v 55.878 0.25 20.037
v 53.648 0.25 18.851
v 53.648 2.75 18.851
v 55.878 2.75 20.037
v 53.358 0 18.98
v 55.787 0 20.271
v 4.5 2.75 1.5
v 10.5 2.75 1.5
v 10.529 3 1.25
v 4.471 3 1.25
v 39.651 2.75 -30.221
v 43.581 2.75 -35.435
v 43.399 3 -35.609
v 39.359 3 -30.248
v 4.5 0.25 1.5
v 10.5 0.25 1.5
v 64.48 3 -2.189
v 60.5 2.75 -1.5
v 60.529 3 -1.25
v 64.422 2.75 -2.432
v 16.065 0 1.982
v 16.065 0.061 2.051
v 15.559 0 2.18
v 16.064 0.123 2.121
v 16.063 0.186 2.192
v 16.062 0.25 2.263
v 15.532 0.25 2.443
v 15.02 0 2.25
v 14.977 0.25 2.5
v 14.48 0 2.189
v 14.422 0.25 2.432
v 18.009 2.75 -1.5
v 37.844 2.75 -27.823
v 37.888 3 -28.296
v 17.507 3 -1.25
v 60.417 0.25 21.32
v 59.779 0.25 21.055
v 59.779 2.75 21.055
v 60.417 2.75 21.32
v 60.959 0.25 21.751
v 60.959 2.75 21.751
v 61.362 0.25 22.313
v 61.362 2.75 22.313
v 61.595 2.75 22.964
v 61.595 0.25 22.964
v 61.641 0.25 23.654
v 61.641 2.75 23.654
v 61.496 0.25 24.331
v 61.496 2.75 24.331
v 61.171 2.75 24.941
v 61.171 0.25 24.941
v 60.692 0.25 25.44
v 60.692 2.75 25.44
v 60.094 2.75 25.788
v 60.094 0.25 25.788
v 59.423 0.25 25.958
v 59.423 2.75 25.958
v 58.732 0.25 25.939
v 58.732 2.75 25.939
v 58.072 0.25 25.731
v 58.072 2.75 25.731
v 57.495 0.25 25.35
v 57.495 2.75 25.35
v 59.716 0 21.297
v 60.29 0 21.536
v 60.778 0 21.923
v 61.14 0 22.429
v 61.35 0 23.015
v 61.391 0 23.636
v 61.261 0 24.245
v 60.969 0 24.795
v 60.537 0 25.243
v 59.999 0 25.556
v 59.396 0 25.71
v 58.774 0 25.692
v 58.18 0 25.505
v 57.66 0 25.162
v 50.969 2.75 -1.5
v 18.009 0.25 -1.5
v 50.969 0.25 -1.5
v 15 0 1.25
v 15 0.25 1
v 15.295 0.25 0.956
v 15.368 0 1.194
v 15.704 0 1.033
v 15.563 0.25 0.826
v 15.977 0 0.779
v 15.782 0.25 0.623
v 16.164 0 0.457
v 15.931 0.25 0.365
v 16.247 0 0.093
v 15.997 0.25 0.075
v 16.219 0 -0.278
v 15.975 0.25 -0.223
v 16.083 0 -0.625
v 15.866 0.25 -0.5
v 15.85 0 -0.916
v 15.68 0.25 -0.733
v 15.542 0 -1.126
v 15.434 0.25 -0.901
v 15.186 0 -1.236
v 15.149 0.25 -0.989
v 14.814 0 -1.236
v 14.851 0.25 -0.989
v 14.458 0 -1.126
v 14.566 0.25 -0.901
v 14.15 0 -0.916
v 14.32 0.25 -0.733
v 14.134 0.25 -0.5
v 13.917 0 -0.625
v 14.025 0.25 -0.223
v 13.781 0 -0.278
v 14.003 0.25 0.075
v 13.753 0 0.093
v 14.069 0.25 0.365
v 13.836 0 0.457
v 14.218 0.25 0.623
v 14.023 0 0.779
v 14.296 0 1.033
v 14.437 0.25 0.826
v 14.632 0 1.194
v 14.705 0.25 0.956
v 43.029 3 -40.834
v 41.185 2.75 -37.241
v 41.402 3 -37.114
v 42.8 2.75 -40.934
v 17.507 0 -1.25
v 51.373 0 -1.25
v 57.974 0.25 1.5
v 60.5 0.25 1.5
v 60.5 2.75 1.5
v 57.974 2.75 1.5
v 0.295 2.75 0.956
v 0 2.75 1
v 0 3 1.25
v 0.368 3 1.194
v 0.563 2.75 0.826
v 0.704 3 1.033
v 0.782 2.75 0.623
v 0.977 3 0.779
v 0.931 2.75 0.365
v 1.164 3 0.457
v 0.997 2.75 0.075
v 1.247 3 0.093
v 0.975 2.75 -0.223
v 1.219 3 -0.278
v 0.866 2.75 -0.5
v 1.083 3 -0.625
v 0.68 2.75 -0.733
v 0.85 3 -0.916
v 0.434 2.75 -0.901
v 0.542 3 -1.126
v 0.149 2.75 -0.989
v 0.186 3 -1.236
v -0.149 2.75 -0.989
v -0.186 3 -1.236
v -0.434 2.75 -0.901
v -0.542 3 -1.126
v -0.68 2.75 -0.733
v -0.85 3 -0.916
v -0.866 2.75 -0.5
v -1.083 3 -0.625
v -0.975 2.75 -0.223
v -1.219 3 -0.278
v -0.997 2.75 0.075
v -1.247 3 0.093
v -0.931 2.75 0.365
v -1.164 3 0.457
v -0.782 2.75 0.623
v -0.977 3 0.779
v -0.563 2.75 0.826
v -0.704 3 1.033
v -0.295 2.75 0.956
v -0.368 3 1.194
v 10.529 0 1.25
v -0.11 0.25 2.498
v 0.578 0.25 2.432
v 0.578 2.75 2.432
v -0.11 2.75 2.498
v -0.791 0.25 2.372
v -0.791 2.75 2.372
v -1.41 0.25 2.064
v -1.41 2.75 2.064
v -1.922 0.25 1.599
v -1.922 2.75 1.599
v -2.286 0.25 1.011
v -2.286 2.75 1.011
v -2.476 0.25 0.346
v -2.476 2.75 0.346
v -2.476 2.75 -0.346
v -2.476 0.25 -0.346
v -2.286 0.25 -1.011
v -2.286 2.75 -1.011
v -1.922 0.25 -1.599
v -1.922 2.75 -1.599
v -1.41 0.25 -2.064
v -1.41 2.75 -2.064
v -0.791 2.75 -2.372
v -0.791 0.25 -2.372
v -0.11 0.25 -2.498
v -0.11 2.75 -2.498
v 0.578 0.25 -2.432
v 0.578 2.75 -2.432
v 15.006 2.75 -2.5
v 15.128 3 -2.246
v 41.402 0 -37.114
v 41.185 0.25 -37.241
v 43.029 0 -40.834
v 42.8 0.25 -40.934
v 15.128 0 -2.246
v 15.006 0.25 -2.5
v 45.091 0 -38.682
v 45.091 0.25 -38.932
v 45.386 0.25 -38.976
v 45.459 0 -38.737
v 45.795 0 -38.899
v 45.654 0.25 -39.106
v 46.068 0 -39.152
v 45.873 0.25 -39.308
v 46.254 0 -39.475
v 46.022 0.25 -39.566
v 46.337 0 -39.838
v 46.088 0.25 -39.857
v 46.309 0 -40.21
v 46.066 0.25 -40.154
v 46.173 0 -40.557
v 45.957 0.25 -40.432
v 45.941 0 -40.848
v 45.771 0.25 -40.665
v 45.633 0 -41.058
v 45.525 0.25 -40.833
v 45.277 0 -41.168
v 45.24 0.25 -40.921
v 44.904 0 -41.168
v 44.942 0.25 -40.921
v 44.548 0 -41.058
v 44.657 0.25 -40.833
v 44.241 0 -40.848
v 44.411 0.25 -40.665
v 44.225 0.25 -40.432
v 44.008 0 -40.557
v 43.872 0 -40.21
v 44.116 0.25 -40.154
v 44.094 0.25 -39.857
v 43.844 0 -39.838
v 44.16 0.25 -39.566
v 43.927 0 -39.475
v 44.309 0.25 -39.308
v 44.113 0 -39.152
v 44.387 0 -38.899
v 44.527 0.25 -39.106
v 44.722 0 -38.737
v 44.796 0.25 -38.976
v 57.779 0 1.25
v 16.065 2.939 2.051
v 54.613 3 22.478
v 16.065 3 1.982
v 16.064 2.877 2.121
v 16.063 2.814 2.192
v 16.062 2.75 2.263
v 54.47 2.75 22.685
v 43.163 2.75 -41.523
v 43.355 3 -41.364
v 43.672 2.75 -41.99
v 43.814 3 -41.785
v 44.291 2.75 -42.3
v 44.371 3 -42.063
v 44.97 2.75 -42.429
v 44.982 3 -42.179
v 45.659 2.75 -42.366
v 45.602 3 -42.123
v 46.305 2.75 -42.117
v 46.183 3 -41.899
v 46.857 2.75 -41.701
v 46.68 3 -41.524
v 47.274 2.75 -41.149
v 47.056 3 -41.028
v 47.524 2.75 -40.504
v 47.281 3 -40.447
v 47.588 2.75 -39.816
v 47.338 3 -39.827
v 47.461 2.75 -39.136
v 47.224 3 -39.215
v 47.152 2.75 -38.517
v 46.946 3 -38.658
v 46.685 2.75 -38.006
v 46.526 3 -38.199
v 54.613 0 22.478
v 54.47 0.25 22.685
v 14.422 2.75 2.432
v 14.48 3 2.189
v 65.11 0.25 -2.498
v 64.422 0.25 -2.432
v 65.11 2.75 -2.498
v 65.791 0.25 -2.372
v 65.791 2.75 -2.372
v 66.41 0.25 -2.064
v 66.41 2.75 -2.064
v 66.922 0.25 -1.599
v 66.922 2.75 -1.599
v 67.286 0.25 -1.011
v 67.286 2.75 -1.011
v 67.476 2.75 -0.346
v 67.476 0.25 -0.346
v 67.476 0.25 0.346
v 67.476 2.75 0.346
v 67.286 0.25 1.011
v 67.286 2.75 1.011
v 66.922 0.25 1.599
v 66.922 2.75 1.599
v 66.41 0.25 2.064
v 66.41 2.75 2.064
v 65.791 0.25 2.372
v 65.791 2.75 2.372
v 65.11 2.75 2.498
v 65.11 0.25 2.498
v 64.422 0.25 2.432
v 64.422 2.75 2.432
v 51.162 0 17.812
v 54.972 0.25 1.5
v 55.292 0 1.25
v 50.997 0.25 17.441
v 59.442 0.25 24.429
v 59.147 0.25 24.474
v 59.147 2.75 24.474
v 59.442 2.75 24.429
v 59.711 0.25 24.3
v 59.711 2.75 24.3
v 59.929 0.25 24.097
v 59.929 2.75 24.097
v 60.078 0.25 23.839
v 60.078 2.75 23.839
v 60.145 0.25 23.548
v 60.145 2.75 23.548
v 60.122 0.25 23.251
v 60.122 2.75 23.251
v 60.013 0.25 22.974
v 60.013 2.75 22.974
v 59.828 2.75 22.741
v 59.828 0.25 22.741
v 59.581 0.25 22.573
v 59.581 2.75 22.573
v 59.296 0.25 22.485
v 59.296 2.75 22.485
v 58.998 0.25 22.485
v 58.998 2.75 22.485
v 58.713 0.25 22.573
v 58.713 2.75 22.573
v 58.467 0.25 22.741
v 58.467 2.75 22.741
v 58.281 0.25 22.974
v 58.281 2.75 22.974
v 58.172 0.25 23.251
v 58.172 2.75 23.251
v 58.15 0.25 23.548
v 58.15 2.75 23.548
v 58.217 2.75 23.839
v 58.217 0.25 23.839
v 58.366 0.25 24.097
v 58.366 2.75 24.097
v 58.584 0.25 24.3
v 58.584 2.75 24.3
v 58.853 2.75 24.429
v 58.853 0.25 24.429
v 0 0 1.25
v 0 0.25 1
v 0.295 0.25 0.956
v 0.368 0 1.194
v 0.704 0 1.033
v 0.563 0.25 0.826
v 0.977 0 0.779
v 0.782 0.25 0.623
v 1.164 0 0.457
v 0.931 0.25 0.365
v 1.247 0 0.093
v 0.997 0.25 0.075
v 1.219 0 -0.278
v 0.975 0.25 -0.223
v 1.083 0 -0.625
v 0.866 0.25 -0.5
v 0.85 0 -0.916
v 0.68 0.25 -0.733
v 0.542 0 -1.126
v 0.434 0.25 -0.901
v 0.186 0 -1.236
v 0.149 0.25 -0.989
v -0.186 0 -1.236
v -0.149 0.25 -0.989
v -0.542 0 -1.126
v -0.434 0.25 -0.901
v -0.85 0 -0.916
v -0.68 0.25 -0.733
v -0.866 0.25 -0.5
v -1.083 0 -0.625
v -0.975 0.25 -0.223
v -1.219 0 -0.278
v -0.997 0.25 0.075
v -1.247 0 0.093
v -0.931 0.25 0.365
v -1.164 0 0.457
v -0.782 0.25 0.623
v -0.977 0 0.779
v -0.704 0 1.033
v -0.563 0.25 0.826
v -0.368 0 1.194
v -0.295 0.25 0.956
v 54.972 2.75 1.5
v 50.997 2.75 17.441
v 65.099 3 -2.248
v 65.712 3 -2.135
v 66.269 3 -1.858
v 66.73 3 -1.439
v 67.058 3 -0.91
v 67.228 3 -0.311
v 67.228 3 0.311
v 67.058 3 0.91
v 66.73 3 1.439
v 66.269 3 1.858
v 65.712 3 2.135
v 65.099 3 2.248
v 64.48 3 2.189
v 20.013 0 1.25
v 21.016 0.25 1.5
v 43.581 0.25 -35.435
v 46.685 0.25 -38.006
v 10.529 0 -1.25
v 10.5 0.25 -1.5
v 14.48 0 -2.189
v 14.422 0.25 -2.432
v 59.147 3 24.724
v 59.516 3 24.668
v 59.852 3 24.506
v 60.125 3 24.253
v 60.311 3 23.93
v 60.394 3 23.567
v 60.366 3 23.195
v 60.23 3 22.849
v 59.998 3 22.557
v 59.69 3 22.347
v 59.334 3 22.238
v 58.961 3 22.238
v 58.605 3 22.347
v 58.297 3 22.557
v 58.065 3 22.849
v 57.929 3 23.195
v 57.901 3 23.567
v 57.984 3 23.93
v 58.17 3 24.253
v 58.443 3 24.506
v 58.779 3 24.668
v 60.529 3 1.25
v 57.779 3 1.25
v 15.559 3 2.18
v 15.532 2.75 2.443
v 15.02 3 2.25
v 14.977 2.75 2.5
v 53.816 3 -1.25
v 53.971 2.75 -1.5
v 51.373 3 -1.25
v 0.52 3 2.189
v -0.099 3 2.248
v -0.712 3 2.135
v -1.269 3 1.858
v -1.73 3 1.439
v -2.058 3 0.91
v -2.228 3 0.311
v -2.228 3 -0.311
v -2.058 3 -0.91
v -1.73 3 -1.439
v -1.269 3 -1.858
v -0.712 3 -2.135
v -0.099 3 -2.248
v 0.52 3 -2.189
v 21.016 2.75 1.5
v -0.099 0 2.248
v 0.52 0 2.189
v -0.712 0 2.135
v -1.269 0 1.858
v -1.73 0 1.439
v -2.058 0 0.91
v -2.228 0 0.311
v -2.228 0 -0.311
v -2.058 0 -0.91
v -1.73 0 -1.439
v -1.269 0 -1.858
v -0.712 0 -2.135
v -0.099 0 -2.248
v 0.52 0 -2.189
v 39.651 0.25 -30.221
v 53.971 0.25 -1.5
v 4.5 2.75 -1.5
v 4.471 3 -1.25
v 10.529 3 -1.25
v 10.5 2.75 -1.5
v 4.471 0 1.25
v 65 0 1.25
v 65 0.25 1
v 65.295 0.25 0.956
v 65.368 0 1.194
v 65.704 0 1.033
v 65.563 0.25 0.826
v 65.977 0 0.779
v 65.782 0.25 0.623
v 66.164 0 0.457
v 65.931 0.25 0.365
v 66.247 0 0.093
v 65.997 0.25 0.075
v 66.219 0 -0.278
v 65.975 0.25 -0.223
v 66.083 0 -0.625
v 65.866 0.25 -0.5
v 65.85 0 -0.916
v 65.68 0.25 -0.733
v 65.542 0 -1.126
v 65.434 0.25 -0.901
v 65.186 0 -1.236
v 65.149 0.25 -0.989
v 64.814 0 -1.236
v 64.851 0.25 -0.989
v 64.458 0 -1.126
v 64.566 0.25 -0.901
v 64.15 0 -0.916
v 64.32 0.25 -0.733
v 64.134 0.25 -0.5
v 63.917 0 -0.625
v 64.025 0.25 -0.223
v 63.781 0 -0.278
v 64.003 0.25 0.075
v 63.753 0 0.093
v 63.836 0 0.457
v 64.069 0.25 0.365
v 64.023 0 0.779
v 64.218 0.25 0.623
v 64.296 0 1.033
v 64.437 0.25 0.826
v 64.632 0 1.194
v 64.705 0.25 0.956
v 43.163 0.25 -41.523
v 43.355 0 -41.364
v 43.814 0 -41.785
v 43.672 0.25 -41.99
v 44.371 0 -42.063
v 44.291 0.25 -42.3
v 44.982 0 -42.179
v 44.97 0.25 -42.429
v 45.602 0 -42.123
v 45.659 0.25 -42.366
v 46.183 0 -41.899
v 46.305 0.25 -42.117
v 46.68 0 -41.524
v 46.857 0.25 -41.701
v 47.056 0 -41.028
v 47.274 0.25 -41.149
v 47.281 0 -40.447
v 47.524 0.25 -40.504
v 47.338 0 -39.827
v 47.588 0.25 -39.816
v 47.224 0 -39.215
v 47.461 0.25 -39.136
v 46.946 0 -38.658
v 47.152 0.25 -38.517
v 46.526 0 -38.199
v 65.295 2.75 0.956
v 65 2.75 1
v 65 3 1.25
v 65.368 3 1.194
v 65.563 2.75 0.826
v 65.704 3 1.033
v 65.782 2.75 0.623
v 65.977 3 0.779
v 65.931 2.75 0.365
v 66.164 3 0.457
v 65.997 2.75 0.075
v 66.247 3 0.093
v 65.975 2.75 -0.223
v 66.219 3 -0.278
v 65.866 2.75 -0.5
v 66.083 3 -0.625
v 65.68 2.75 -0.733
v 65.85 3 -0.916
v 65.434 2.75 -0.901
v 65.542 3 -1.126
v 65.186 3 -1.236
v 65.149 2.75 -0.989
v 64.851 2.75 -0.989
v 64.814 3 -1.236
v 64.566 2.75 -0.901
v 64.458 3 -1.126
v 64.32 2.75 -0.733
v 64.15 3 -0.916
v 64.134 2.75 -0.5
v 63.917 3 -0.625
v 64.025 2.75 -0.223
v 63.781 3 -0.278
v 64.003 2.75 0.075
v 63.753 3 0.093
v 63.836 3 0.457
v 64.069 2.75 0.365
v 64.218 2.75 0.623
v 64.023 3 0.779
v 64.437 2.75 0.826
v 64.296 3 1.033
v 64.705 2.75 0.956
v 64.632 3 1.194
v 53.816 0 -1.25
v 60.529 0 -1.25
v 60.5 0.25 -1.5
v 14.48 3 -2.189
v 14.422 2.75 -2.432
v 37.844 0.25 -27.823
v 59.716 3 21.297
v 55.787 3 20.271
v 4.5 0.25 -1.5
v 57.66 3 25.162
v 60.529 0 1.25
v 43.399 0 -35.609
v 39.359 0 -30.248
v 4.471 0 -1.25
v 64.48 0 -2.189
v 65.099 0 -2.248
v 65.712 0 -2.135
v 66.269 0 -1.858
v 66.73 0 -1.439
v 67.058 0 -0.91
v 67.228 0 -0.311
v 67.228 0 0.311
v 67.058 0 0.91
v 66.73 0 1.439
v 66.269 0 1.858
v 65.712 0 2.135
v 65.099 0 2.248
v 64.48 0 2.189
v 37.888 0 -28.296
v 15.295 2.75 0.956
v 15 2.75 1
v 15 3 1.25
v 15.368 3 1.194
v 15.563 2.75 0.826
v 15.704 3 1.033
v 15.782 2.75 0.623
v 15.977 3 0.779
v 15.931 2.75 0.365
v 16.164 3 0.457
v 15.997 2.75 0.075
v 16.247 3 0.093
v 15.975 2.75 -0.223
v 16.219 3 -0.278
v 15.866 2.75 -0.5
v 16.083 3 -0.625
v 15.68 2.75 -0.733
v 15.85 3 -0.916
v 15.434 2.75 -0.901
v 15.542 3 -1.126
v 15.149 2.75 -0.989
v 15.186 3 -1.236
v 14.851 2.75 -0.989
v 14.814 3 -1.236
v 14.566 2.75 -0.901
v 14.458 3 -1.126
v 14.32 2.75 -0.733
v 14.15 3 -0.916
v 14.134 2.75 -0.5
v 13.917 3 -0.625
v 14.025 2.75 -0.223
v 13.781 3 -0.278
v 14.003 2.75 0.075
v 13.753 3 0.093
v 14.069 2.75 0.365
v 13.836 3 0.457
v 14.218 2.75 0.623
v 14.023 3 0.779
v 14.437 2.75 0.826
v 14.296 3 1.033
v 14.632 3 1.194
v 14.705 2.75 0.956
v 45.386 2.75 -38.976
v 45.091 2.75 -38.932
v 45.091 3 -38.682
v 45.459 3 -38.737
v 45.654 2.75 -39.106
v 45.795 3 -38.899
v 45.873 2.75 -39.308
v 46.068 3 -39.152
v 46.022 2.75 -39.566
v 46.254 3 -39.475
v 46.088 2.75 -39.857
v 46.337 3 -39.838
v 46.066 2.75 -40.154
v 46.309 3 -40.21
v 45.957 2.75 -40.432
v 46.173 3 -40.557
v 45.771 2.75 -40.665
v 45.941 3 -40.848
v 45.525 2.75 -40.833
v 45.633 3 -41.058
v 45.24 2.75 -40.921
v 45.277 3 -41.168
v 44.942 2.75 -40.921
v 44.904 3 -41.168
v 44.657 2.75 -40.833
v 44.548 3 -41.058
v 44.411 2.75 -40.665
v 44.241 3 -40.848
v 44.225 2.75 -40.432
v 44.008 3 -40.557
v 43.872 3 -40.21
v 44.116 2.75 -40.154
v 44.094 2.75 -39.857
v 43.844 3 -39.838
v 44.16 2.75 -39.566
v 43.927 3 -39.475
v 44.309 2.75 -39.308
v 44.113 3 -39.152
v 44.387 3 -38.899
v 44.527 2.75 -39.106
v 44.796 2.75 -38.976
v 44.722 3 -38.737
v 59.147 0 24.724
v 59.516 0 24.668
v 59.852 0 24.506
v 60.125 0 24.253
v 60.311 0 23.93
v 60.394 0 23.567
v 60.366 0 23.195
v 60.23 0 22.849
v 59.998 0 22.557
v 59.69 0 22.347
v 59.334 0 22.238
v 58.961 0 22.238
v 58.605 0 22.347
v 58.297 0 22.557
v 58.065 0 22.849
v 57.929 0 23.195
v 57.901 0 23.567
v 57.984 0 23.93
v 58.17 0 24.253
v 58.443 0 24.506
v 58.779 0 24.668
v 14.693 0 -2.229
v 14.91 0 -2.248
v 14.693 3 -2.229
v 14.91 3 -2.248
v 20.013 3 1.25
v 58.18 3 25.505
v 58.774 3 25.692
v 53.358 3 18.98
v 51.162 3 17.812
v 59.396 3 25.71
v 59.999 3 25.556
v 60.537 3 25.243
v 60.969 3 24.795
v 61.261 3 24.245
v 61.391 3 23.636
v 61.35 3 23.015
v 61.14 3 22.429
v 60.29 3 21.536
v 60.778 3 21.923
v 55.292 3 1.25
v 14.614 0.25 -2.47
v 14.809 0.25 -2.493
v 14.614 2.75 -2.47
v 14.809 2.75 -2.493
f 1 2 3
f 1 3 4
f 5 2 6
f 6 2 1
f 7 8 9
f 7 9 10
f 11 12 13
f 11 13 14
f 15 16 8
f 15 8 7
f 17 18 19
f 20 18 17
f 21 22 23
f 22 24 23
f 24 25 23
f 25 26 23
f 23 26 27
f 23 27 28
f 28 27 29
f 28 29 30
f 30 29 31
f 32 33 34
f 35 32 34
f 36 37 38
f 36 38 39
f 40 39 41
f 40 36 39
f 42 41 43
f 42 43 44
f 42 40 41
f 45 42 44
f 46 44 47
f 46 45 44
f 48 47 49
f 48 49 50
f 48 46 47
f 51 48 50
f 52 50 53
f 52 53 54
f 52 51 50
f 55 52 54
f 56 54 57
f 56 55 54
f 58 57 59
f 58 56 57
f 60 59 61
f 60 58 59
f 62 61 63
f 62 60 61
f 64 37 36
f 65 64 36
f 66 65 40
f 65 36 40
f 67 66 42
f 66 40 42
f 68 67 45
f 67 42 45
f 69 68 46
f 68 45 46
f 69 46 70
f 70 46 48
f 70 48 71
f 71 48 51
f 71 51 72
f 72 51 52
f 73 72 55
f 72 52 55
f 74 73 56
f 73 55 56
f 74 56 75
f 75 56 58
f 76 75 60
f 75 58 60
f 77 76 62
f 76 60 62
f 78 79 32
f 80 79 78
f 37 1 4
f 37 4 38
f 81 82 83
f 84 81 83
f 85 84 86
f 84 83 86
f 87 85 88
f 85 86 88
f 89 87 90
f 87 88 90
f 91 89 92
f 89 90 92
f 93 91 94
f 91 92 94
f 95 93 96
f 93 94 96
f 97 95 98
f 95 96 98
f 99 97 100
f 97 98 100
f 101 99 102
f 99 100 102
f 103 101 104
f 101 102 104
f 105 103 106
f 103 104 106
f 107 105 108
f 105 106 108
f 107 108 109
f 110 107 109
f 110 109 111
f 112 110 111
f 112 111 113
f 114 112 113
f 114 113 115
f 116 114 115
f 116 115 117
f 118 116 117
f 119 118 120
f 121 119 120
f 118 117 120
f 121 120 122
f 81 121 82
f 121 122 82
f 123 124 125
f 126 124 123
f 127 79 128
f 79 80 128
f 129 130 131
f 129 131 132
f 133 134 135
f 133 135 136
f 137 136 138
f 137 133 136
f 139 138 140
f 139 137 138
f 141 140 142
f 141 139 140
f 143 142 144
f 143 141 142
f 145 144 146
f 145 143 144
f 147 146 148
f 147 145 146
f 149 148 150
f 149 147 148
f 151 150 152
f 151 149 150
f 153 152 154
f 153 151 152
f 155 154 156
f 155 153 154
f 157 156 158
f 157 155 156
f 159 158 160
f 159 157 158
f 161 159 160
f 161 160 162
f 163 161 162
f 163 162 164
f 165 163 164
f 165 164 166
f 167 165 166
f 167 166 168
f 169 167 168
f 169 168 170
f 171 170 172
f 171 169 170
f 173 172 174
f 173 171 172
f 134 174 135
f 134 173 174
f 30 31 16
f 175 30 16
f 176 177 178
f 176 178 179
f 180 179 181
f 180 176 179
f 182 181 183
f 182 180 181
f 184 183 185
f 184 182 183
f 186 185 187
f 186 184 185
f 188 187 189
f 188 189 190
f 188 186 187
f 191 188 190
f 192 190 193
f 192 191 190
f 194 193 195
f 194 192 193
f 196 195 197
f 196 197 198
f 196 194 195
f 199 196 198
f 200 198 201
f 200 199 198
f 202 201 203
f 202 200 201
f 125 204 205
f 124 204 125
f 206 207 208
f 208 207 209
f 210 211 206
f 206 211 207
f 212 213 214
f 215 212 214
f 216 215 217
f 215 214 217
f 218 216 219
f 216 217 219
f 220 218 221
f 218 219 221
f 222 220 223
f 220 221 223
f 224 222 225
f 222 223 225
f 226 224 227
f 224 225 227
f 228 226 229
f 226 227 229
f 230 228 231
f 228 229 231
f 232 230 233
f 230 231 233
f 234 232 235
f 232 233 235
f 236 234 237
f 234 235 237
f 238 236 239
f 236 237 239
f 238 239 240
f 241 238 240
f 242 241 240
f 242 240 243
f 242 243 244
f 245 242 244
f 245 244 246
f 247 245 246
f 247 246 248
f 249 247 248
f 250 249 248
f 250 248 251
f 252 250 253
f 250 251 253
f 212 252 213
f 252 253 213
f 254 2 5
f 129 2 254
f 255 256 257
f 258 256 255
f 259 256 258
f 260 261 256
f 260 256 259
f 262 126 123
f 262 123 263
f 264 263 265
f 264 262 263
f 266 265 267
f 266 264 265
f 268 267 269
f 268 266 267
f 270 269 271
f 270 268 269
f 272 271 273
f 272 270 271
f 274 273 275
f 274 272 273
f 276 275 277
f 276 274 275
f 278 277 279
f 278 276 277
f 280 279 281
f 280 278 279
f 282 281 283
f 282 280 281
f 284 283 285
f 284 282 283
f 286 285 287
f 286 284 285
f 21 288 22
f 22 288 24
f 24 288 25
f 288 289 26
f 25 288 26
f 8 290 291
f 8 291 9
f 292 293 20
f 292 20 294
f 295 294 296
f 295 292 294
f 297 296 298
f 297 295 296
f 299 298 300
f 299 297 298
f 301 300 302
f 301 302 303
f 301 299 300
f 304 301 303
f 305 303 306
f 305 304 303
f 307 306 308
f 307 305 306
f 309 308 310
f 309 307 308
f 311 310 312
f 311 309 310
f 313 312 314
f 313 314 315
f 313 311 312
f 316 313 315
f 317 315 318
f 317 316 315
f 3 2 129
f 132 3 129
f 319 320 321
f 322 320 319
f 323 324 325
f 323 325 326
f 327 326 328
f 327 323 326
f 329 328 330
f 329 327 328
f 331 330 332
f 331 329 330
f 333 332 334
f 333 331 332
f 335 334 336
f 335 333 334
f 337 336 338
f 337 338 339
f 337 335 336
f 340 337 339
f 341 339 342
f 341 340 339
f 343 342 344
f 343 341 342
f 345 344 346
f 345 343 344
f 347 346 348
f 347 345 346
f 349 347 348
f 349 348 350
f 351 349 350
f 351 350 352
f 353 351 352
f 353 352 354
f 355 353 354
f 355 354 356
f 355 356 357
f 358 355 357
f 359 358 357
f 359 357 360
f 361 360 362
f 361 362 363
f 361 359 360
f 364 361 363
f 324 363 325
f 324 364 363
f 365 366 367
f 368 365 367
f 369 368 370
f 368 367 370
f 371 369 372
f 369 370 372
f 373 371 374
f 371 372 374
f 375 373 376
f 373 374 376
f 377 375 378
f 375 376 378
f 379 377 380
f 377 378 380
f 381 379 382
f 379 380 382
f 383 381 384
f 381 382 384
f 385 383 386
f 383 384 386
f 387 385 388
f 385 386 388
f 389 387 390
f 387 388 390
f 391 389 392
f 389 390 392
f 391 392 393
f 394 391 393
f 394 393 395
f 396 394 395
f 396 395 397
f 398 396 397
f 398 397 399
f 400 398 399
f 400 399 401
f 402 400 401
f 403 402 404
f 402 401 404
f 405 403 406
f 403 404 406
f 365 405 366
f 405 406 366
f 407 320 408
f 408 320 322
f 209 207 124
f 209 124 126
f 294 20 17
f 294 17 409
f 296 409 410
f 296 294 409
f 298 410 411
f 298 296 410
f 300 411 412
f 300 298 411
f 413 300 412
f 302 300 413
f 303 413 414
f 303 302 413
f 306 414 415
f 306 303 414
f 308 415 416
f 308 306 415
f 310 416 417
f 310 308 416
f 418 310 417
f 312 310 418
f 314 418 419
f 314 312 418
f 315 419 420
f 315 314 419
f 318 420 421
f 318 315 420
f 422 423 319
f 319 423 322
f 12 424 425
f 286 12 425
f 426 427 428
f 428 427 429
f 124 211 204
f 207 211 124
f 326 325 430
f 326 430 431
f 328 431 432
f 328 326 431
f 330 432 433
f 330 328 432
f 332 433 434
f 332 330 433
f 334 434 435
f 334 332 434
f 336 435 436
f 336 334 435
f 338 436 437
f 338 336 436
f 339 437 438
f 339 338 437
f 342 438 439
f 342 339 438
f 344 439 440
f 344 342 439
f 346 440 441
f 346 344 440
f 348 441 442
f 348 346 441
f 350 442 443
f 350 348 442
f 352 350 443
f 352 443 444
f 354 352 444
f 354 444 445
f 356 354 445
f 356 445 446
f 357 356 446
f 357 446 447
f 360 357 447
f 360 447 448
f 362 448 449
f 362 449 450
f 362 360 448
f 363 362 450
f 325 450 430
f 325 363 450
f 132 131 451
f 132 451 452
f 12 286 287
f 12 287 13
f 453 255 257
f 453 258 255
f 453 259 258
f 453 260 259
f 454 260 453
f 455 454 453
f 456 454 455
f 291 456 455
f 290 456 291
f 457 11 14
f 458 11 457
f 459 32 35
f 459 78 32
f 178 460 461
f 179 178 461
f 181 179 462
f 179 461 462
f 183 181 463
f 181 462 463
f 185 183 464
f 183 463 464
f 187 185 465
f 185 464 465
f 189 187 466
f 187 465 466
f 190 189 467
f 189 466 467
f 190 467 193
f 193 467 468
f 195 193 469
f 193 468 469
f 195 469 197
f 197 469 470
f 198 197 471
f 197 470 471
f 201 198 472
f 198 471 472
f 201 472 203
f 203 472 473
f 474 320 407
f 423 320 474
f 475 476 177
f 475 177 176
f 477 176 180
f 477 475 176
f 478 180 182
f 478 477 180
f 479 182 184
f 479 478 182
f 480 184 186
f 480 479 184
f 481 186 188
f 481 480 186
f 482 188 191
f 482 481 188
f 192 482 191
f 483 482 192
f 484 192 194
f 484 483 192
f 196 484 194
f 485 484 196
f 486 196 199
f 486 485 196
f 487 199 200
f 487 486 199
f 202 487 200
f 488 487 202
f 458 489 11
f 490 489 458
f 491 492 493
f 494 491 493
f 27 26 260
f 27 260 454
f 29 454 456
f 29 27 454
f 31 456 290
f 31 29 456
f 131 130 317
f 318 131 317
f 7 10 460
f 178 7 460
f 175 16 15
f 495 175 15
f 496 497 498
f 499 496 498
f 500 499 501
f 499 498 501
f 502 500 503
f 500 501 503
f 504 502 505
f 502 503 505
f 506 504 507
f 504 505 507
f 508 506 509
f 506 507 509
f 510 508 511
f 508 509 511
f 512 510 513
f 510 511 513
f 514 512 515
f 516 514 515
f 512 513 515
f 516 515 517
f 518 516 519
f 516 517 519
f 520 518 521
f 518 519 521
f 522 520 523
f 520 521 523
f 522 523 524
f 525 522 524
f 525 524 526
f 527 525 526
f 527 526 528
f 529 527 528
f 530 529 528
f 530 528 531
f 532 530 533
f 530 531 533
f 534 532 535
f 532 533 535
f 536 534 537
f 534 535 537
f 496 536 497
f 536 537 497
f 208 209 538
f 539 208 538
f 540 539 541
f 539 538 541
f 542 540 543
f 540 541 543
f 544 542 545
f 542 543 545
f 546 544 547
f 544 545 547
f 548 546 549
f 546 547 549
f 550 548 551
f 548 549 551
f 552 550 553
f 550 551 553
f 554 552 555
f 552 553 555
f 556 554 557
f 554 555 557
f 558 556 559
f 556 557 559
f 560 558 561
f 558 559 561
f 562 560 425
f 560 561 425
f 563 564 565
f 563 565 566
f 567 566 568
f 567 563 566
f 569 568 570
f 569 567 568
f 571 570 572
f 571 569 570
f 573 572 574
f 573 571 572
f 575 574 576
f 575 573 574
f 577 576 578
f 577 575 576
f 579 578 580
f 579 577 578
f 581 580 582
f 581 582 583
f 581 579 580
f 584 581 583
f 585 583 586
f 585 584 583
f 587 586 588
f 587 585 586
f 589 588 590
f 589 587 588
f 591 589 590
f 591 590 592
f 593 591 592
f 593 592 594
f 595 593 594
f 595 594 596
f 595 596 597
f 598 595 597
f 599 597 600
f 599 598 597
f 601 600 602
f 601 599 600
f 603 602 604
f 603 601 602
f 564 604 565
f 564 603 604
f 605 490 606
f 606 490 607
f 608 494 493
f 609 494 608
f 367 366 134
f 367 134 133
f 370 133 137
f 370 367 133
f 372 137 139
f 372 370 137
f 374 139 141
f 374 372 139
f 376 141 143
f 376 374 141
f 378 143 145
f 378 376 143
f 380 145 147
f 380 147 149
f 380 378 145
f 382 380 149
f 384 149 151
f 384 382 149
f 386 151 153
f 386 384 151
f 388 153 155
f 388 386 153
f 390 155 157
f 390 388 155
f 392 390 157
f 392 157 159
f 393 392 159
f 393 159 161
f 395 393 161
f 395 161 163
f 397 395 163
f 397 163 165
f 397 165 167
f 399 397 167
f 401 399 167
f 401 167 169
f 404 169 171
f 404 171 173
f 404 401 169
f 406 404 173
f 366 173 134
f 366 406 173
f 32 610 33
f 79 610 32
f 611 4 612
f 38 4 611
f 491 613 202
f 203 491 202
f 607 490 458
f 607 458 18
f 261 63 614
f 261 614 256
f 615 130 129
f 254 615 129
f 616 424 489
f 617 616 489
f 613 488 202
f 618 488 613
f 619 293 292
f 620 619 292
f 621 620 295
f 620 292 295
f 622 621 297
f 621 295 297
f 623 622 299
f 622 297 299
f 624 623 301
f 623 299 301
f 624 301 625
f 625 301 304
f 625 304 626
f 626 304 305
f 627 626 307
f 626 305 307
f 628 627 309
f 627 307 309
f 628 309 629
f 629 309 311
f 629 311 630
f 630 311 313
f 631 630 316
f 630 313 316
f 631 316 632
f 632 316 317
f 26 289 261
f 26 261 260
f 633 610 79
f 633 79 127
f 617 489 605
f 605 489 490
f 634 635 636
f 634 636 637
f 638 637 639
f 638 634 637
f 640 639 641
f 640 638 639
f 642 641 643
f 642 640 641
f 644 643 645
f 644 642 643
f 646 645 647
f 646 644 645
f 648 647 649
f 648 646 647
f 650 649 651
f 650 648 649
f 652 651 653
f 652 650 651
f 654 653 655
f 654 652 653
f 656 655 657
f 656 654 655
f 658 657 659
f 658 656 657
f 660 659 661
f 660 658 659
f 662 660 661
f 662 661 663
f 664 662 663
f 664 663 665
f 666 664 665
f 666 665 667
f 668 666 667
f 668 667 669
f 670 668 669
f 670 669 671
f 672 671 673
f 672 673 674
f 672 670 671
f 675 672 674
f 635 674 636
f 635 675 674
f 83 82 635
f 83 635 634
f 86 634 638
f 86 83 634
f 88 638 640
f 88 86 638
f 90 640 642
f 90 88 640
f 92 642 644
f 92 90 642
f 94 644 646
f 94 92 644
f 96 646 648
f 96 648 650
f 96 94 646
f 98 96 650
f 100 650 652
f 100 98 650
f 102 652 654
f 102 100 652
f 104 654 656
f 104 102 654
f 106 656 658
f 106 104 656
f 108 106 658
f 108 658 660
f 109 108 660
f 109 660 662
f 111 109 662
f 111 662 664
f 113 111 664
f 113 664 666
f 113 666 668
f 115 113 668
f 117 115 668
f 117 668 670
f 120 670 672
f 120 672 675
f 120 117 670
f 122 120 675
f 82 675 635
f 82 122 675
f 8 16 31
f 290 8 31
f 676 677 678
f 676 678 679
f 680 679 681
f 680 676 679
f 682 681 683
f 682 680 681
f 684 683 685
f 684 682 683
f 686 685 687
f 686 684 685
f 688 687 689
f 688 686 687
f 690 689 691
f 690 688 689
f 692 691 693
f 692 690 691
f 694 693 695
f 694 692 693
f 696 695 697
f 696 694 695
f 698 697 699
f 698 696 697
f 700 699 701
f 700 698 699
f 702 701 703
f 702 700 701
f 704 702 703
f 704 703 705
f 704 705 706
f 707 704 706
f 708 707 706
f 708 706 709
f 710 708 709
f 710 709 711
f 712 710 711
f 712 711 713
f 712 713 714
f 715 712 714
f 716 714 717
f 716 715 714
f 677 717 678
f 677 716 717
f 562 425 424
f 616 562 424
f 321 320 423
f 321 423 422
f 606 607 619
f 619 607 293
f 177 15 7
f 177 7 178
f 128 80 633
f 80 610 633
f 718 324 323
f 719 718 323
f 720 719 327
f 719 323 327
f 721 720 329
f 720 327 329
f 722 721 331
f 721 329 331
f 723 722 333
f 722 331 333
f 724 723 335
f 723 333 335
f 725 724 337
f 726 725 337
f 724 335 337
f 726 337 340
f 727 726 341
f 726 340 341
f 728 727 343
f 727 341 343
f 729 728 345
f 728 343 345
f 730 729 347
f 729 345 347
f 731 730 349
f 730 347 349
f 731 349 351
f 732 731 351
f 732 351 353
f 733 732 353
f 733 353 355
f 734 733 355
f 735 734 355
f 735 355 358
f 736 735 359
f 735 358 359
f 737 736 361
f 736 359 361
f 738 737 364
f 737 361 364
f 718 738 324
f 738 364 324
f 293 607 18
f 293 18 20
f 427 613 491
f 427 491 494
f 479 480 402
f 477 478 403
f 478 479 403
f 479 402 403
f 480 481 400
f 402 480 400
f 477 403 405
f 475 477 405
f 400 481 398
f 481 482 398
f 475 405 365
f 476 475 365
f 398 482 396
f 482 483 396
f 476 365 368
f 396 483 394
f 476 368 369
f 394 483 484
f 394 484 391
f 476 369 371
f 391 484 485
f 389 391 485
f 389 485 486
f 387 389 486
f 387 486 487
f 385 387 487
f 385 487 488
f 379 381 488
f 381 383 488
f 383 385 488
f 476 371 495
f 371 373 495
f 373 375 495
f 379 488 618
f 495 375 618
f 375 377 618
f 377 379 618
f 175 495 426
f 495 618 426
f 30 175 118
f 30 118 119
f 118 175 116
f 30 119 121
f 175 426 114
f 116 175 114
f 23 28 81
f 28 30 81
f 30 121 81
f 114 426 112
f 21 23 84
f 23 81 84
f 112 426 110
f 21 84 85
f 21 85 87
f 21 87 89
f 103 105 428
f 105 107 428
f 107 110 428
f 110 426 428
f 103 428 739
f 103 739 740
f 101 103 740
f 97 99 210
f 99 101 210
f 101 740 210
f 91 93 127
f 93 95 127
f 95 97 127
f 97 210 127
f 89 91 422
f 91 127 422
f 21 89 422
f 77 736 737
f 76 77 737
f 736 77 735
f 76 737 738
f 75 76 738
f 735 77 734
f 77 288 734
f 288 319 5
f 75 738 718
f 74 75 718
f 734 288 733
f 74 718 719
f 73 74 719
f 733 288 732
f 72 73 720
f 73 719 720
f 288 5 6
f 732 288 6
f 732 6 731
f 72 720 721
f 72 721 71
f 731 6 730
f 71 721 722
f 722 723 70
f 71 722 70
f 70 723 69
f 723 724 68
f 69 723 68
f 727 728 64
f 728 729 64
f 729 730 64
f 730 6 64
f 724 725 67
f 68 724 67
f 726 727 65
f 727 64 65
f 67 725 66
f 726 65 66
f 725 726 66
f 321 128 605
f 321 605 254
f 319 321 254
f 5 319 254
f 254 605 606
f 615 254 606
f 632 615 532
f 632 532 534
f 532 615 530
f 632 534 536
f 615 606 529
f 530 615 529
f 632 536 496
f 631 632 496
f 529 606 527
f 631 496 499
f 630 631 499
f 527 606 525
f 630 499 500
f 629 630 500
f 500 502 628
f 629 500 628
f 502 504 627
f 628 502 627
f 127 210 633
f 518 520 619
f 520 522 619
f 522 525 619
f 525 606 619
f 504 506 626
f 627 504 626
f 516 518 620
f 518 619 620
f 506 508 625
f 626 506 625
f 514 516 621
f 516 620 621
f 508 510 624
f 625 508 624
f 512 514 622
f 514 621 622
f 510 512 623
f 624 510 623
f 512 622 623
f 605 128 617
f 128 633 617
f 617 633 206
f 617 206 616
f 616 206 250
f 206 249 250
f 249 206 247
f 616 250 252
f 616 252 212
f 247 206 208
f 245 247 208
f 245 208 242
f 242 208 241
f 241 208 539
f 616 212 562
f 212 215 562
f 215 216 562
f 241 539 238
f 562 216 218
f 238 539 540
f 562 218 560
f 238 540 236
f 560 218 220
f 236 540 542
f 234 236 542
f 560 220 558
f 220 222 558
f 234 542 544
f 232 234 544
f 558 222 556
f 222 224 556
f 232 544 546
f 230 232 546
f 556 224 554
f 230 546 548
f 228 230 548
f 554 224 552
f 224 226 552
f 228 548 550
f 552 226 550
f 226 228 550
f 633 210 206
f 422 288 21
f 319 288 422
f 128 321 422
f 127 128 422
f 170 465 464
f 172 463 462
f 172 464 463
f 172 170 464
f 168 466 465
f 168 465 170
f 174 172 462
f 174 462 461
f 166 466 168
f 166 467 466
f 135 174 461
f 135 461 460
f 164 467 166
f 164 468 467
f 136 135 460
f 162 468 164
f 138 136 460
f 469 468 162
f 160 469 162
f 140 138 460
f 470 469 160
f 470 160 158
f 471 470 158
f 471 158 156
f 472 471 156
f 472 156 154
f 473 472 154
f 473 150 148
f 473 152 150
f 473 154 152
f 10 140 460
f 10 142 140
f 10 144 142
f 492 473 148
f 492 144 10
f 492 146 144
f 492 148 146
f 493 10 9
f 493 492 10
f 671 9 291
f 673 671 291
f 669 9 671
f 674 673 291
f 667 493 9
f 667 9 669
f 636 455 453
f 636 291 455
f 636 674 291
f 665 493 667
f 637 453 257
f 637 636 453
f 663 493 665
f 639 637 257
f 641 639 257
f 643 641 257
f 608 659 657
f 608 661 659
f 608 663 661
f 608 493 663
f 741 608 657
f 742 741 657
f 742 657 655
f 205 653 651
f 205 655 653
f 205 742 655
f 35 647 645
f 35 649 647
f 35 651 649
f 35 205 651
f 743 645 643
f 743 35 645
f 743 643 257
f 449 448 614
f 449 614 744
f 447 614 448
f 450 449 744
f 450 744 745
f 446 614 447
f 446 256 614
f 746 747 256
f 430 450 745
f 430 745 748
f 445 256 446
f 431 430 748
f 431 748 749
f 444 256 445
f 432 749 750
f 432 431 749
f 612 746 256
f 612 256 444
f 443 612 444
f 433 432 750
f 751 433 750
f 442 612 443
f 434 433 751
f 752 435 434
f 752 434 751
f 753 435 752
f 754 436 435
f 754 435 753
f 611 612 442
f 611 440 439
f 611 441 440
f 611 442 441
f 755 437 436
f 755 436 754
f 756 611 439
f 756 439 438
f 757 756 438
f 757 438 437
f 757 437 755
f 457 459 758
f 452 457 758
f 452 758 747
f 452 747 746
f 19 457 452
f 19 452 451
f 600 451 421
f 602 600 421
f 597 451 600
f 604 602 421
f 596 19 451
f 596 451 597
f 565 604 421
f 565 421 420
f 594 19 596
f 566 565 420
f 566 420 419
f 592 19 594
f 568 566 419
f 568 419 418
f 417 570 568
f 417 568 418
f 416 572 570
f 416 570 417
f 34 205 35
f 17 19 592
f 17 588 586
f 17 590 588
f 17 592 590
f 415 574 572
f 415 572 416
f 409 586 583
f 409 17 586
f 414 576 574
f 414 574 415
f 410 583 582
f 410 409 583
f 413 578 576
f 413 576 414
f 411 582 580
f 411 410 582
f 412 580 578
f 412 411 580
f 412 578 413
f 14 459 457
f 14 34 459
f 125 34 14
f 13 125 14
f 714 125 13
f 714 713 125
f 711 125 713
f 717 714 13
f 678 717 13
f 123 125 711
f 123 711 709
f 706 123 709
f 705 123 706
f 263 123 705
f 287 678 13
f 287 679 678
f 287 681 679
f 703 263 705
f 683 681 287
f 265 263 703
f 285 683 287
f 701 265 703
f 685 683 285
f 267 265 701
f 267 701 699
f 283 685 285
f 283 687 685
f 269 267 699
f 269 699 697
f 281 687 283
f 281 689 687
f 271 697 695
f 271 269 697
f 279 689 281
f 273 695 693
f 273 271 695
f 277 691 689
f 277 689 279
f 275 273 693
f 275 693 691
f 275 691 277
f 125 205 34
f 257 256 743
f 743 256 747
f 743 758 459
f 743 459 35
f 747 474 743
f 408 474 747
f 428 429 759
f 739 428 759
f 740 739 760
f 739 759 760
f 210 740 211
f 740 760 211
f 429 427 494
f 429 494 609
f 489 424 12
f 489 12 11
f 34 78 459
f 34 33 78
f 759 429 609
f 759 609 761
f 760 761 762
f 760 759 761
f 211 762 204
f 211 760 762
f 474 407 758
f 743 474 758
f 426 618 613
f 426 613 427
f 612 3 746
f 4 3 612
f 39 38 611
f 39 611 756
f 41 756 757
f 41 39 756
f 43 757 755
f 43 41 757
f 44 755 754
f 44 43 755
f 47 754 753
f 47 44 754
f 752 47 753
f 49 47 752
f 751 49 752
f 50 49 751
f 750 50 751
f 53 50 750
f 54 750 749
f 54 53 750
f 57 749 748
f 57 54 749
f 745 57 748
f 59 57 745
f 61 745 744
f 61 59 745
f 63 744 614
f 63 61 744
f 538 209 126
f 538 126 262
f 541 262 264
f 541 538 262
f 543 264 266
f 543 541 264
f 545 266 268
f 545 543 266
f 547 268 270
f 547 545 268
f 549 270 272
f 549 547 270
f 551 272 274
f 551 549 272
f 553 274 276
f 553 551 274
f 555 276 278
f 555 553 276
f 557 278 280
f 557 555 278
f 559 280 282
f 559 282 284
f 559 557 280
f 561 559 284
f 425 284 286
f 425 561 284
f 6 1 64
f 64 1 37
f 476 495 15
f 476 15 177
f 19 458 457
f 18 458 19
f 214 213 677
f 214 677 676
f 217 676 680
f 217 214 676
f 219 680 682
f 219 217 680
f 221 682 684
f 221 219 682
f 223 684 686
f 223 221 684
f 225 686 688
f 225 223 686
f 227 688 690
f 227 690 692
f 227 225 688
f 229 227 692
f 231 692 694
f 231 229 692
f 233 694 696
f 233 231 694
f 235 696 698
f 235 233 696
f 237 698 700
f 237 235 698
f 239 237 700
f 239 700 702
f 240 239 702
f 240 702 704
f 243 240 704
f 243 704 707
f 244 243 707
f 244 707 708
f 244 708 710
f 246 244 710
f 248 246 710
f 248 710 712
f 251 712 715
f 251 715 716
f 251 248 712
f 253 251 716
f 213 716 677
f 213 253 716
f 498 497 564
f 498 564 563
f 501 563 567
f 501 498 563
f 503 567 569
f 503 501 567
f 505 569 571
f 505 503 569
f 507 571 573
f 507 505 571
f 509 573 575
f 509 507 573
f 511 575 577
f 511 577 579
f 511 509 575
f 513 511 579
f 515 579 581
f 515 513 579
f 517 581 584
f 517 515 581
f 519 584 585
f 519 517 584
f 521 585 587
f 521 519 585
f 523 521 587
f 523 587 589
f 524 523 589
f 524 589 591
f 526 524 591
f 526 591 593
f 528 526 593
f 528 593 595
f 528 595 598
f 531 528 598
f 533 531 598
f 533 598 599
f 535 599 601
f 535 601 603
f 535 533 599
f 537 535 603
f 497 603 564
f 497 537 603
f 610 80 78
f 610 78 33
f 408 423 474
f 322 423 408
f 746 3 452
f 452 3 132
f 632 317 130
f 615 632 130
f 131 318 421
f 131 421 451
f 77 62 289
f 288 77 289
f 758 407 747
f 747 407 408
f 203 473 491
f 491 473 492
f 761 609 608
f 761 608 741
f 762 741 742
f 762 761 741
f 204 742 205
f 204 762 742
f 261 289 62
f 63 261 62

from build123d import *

# Parameters (mm, degrees)
SKETCH_1_R      = 1
EXTRUDE_2_DEPTH = 3
SKETCH_3_R      = 1
EXTRUDE_3_DEPTH = 3
EXTRUDE_4_DEPTH = 3
EXTRUDE_5_DEPTH = 3
EXTRUDE_6_DEPTH = 3
CHAMFER_1_SIZE  = 0.25


with BuildPart() as part:
    # 草图1 → 凸台-拉伸2 (new body)
    with BuildSketch(Plane(origin=(0, 0, 0), x_dir=(1, 0, 0), z_dir=(0, 1, 0))):
        with BuildLine():
            Line((2, 1.5), (13, 1.5))
            ThreePointArc((13, 1.5), (15, 2.5), (17, 1.5))
            Line((17, 1.5), (63, 1.5))
            ThreePointArc((63, 1.5), (67.5, 0), (63, -1.5))
            Line((63, -1.5), (17, -1.5))
            ThreePointArc((17, -1.5), (15, -2.5), (13, -1.5))
            Line((13, -1.5), (2, -1.5))
            ThreePointArc((2, -1.5), (-2.5, 0), (2, 1.5))
        make_face()
        with Locations(Location((0, 0, 0), (0, 0, 270))):
            Circle(SKETCH_1_R, mode=Mode.SUBTRACT)
        with Locations(Location((15, 0, 0), (0, 0, 270))):
            Circle(SKETCH_1_R, mode=Mode.SUBTRACT)
        with Locations(Location((65, 0, 0), (0, 0, 270))):
            Circle(SKETCH_1_R, mode=Mode.SUBTRACT)
    extrude(amount=EXTRUDE_2_DEPTH)

    # 草图3 → 凸台-拉伸3 (add)
    with BuildSketch(Plane(origin=(0, 0, 0), x_dir=(1, 0, 0), z_dir=(0, 1, 0))):
        with BuildLine():
            Line((15.005676781, 2.499993555), (42.689167846, 39.237227017))
            ThreePointArc((42.689167846, 39.237227017), (46.595288715, 41.928364277), (45.085074376, 37.431781948))
            Line((45.085074376, 37.431781948), (17.401583311, 0.694548485))
            ThreePointArc((17.401583311, 0.694548485), (17.440740018, 0.541099035), (17.47010253, 0.385478264))
            Line((17.47010253, 0.385478264), (58.085691801, -21.210213624))
            ThreePointArc((58.085691801, -21.210213624), (61.354748625, -24.647257046), (56.677277113, -23.859056403))
            Line((56.677277113, -23.859056403), (16.061687842, -2.263364515))
            ThreePointArc((16.061687842, -2.263364515), (12.559259982, -0.541099035), (15.005676781, 2.499993555))
        make_face()
        with Locations(Location((59.147379643, -23.473578139, 0), (0, 0, 270))):
            Circle(SKETCH_3_R, mode=Mode.SUBTRACT)
        with Locations(Location((45.090751158, 39.931775502, 0), (0, 0, 270))):
            Circle(SKETCH_3_R, mode=Mode.SUBTRACT)
        with Locations(Location((15, 0, 0), (0, 0, 270))):
            Circle(SKETCH_3_R, mode=Mode.SUBTRACT)
    extrude(amount=EXTRUDE_3_DEPTH)

    # 草图5 → 凸台-拉伸4 (add)
    with BuildSketch(Plane(origin=(0, 0, 0), x_dir=(1, 0, 0), z_dir=(0, 1, 0))):
        Polygon((50.968736425, 1.5), (37.844479209, 27.823187626), (39.651372694, 30.221016268), (53.97114317, 1.5), align=None)
    extrude(amount=EXTRUDE_4_DEPTH)

    # 草图6 → 凸台-拉伸5 (add)
    with BuildSketch(Plane(origin=(0, 0, 0), x_dir=(1, 0, 0), z_dir=(0, 1, 0))):
        Polygon((54.971865105, -1.5), (50.997269421, -17.441232589), (53.647846432, -18.850569385), (57.973829245, -1.5), align=None)
    extrude(amount=EXTRUDE_5_DEPTH)

    # 草图7 → 凸台-拉伸6 (add)
    with BuildSketch(Plane(origin=(0, 0, 0), x_dir=(1, 0, 0), z_dir=(0, 1, 0))):
        with BuildLine():
            Line((4.5, 1.5), (0.578145188, 2.432231104))
            ThreePointArc((0.578145188, 2.432231104), (1.370755945, 2.090700395), (2, 1.5))
            Line((2, 1.5), (4.5, 1.5))
        make_face()
        with BuildLine():
            Line((4.5, -1.5), (0.578145188, -2.432231104))
            ThreePointArc((0.578145188, -2.432231104), (1.370755945, -2.090700395), (2, -1.5))
            Line((2, -1.5), (4.5, -1.5))
        make_face()
        with BuildLine():
            Line((10.5, 1.5), (14.421854812, 2.432231104))
            ThreePointArc((14.421854812, 2.432231104), (13.629244055, 2.090700395), (13, 1.5))
            Line((13, 1.5), (10.5, 1.5))
        make_face()
        with BuildLine():
            Line((10.5, -1.5), (14.421854812, -2.432231104))
            ThreePointArc((14.421854812, -2.432231104), (13.629244055, -2.090700395), (13, -1.5))
            Line((13, -1.5), (10.5, -1.5))
        make_face()
        with BuildLine():
            Line((41.184630288, 37.240638242), (42.80034857, 40.933801444))
            ThreePointArc((42.80034857, 40.933801444), (42.596102061, 40.095256036), (42.689167846, 39.237227017))
            Line((42.689167846, 39.237227017), (41.184630288, 37.240638242))
        make_face()
        with BuildLine():
            Line((43.580536818, 35.435193172), (46.685280826, 38.006295008))
            ThreePointArc((46.685280826, 38.006295008), (45.935517213, 37.578826223), (45.085074376, 37.431781948))
            Line((45.085074376, 37.431781948), (43.580536818, 35.435193172))
        make_face()
        with BuildLine():
            Line((60.5, -1.5), (64.421854812, -2.432231104))
            ThreePointArc((64.421854812, -2.432231104), (63.629244055, -2.090700395), (63, -1.5))
            Line((63, -1.5), (60.5, -1.5))
        make_face()
        with BuildLine():
            Line((60.5, 1.5), (64.421854812, 2.432231104))
            ThreePointArc((64.421854812, 2.432231104), (63.629244055, 2.090700395), (63, 1.5))
            Line((63, 1.5), (60.5, 1.5))
        make_face()
        with BuildLine():
            Line((55.878322819, -20.036534717), (59.778771079, -21.054622816))
            ThreePointArc((59.778771079, -21.054622816), (58.918598363, -20.984068323), (58.085691801, -21.210213624))
            Line((58.085691801, -21.210213624), (55.878322819, -20.036534717))
        make_face()
        with BuildLine():
            Line((54.469908131, -22.685377496), (57.495044404, -25.349688013))
            ThreePointArc((57.495044404, -25.349688013), (56.9555496, -24.676026085), (56.677277113, -23.859056403))
            Line((56.677277113, -23.859056403), (54.469908131, -22.685377496))
        make_face()
    extrude(amount=EXTRUDE_6_DEPTH)

    # 倒角1
    chamfer_1_edges = [part.edges().sort_by_distance(p)[0] for p in [
        (57.235571585, 0, -1.5),
        (57.235571585, 3, -1.5),
        (62.460927406, 0, -1.966115552),
        (62.460927406, 3, -1.966115552),
        (46.595288715, 3, -41.928364277),
        (46.595288715, 0, -41.928364277),
        (45.132908822, 0, -36.72074409),
        (45.132908822, 3, -36.72074409),
        (-2.5, 0, 0),
        (-2.5, 3, 0),
        (2.539072594, 0, -1.966115552),
        (2.539072594, 3, -1.966115552),
        (28.095153535, 3, -19.870315898),
        (28.095153535, 0, -19.870315898),
        (41.992489429, 0, -39.087219843),
        (41.992489429, 3, -39.087219843),
        (7.5, 0, 1.5),
        (7.5, 3, 1.5),
        (2.539072594, 0, 1.966115552),
        (2.539072594, 3, 1.966115552),
        (7.5, 0, -1.5),
        (7.5, 3, -1.5),
        (12.460927406, 0, -1.966115552),
        (12.460927406, 3, -1.966115552),
        (15.256090523, 0, 2.486848939),
        (15.256090523, 3, 2.486848939),
        (12.460927406, 0, 1.966115552),
        (12.460927406, 3, 1.966115552),
        (61.354748625, 3, 24.647257046),
        (61.354748625, 0, 24.647257046),
        (55.982476267, 0, 24.017532754),
        (55.982476267, 3, 24.017532754),
        (54.763084626, 0, 19.443552051),
        (54.763084626, 3, 19.443552051),
        (57.828546949, 0, 20.545578767),
        (57.828546949, 3, 20.545578767),
        (67.5, 0, 0),
        (67.5, 3, 0),
        (62.460927406, 0, 1.966115552),
        (62.460927406, 3, 1.966115552),
        (0, 0, -1),
        (0, 3, -1),
        (15, 0, -1),
        (15, 3, -1),
        (65, 0, -1),
        (65, 3, -1),
        (14.71176753, 0, -2.483328823),
        (14.71176753, 3, -2.483328823),
        (37.994018253, 0, 1.5),
        (37.994018253, 3, 1.5),
        (27.926506886, 0, -14.661593813),
        (59.147379643, 0, 22.473578139),
        (45.090751158, 0, -40.931775502),
        (35.265797986, 3, 12.474371005),
        (27.926506886, 3, -14.661593813),
        (45.090751158, 3, -40.931775502),
        (59.147379643, 3, 22.473578139),
        (35.265797986, 0, 12.474371005),
        (41.615954756, 3, -32.82810472),
        (41.615954756, 0, -32.82810472),
        (34.488635494, 0, -1.5),
        (34.488635494, 3, -1.5),
        (46.811257932, 0, -15.860508134),
        (44.406607817, 0, -14.661593813),
        (44.406607817, 3, -14.661593813),
        (46.811257932, 3, -15.860508134),
        (36.006720411, 0, 9.470616295),
        (36.006720411, 3, 9.470616295),
        (59.236914623, 0, 1.5),
        (59.236914623, 3, 1.5),
        (55.810837839, 0, 10.175284693),
        (52.984567263, 0, 9.470616295),
        (52.984567263, 3, 9.470616295),
        (55.810837839, 3, 10.175284693),
    ]]
    chamfer(chamfer_1_edges, length=CHAMFER_1_SIZE)


solid = part.part
